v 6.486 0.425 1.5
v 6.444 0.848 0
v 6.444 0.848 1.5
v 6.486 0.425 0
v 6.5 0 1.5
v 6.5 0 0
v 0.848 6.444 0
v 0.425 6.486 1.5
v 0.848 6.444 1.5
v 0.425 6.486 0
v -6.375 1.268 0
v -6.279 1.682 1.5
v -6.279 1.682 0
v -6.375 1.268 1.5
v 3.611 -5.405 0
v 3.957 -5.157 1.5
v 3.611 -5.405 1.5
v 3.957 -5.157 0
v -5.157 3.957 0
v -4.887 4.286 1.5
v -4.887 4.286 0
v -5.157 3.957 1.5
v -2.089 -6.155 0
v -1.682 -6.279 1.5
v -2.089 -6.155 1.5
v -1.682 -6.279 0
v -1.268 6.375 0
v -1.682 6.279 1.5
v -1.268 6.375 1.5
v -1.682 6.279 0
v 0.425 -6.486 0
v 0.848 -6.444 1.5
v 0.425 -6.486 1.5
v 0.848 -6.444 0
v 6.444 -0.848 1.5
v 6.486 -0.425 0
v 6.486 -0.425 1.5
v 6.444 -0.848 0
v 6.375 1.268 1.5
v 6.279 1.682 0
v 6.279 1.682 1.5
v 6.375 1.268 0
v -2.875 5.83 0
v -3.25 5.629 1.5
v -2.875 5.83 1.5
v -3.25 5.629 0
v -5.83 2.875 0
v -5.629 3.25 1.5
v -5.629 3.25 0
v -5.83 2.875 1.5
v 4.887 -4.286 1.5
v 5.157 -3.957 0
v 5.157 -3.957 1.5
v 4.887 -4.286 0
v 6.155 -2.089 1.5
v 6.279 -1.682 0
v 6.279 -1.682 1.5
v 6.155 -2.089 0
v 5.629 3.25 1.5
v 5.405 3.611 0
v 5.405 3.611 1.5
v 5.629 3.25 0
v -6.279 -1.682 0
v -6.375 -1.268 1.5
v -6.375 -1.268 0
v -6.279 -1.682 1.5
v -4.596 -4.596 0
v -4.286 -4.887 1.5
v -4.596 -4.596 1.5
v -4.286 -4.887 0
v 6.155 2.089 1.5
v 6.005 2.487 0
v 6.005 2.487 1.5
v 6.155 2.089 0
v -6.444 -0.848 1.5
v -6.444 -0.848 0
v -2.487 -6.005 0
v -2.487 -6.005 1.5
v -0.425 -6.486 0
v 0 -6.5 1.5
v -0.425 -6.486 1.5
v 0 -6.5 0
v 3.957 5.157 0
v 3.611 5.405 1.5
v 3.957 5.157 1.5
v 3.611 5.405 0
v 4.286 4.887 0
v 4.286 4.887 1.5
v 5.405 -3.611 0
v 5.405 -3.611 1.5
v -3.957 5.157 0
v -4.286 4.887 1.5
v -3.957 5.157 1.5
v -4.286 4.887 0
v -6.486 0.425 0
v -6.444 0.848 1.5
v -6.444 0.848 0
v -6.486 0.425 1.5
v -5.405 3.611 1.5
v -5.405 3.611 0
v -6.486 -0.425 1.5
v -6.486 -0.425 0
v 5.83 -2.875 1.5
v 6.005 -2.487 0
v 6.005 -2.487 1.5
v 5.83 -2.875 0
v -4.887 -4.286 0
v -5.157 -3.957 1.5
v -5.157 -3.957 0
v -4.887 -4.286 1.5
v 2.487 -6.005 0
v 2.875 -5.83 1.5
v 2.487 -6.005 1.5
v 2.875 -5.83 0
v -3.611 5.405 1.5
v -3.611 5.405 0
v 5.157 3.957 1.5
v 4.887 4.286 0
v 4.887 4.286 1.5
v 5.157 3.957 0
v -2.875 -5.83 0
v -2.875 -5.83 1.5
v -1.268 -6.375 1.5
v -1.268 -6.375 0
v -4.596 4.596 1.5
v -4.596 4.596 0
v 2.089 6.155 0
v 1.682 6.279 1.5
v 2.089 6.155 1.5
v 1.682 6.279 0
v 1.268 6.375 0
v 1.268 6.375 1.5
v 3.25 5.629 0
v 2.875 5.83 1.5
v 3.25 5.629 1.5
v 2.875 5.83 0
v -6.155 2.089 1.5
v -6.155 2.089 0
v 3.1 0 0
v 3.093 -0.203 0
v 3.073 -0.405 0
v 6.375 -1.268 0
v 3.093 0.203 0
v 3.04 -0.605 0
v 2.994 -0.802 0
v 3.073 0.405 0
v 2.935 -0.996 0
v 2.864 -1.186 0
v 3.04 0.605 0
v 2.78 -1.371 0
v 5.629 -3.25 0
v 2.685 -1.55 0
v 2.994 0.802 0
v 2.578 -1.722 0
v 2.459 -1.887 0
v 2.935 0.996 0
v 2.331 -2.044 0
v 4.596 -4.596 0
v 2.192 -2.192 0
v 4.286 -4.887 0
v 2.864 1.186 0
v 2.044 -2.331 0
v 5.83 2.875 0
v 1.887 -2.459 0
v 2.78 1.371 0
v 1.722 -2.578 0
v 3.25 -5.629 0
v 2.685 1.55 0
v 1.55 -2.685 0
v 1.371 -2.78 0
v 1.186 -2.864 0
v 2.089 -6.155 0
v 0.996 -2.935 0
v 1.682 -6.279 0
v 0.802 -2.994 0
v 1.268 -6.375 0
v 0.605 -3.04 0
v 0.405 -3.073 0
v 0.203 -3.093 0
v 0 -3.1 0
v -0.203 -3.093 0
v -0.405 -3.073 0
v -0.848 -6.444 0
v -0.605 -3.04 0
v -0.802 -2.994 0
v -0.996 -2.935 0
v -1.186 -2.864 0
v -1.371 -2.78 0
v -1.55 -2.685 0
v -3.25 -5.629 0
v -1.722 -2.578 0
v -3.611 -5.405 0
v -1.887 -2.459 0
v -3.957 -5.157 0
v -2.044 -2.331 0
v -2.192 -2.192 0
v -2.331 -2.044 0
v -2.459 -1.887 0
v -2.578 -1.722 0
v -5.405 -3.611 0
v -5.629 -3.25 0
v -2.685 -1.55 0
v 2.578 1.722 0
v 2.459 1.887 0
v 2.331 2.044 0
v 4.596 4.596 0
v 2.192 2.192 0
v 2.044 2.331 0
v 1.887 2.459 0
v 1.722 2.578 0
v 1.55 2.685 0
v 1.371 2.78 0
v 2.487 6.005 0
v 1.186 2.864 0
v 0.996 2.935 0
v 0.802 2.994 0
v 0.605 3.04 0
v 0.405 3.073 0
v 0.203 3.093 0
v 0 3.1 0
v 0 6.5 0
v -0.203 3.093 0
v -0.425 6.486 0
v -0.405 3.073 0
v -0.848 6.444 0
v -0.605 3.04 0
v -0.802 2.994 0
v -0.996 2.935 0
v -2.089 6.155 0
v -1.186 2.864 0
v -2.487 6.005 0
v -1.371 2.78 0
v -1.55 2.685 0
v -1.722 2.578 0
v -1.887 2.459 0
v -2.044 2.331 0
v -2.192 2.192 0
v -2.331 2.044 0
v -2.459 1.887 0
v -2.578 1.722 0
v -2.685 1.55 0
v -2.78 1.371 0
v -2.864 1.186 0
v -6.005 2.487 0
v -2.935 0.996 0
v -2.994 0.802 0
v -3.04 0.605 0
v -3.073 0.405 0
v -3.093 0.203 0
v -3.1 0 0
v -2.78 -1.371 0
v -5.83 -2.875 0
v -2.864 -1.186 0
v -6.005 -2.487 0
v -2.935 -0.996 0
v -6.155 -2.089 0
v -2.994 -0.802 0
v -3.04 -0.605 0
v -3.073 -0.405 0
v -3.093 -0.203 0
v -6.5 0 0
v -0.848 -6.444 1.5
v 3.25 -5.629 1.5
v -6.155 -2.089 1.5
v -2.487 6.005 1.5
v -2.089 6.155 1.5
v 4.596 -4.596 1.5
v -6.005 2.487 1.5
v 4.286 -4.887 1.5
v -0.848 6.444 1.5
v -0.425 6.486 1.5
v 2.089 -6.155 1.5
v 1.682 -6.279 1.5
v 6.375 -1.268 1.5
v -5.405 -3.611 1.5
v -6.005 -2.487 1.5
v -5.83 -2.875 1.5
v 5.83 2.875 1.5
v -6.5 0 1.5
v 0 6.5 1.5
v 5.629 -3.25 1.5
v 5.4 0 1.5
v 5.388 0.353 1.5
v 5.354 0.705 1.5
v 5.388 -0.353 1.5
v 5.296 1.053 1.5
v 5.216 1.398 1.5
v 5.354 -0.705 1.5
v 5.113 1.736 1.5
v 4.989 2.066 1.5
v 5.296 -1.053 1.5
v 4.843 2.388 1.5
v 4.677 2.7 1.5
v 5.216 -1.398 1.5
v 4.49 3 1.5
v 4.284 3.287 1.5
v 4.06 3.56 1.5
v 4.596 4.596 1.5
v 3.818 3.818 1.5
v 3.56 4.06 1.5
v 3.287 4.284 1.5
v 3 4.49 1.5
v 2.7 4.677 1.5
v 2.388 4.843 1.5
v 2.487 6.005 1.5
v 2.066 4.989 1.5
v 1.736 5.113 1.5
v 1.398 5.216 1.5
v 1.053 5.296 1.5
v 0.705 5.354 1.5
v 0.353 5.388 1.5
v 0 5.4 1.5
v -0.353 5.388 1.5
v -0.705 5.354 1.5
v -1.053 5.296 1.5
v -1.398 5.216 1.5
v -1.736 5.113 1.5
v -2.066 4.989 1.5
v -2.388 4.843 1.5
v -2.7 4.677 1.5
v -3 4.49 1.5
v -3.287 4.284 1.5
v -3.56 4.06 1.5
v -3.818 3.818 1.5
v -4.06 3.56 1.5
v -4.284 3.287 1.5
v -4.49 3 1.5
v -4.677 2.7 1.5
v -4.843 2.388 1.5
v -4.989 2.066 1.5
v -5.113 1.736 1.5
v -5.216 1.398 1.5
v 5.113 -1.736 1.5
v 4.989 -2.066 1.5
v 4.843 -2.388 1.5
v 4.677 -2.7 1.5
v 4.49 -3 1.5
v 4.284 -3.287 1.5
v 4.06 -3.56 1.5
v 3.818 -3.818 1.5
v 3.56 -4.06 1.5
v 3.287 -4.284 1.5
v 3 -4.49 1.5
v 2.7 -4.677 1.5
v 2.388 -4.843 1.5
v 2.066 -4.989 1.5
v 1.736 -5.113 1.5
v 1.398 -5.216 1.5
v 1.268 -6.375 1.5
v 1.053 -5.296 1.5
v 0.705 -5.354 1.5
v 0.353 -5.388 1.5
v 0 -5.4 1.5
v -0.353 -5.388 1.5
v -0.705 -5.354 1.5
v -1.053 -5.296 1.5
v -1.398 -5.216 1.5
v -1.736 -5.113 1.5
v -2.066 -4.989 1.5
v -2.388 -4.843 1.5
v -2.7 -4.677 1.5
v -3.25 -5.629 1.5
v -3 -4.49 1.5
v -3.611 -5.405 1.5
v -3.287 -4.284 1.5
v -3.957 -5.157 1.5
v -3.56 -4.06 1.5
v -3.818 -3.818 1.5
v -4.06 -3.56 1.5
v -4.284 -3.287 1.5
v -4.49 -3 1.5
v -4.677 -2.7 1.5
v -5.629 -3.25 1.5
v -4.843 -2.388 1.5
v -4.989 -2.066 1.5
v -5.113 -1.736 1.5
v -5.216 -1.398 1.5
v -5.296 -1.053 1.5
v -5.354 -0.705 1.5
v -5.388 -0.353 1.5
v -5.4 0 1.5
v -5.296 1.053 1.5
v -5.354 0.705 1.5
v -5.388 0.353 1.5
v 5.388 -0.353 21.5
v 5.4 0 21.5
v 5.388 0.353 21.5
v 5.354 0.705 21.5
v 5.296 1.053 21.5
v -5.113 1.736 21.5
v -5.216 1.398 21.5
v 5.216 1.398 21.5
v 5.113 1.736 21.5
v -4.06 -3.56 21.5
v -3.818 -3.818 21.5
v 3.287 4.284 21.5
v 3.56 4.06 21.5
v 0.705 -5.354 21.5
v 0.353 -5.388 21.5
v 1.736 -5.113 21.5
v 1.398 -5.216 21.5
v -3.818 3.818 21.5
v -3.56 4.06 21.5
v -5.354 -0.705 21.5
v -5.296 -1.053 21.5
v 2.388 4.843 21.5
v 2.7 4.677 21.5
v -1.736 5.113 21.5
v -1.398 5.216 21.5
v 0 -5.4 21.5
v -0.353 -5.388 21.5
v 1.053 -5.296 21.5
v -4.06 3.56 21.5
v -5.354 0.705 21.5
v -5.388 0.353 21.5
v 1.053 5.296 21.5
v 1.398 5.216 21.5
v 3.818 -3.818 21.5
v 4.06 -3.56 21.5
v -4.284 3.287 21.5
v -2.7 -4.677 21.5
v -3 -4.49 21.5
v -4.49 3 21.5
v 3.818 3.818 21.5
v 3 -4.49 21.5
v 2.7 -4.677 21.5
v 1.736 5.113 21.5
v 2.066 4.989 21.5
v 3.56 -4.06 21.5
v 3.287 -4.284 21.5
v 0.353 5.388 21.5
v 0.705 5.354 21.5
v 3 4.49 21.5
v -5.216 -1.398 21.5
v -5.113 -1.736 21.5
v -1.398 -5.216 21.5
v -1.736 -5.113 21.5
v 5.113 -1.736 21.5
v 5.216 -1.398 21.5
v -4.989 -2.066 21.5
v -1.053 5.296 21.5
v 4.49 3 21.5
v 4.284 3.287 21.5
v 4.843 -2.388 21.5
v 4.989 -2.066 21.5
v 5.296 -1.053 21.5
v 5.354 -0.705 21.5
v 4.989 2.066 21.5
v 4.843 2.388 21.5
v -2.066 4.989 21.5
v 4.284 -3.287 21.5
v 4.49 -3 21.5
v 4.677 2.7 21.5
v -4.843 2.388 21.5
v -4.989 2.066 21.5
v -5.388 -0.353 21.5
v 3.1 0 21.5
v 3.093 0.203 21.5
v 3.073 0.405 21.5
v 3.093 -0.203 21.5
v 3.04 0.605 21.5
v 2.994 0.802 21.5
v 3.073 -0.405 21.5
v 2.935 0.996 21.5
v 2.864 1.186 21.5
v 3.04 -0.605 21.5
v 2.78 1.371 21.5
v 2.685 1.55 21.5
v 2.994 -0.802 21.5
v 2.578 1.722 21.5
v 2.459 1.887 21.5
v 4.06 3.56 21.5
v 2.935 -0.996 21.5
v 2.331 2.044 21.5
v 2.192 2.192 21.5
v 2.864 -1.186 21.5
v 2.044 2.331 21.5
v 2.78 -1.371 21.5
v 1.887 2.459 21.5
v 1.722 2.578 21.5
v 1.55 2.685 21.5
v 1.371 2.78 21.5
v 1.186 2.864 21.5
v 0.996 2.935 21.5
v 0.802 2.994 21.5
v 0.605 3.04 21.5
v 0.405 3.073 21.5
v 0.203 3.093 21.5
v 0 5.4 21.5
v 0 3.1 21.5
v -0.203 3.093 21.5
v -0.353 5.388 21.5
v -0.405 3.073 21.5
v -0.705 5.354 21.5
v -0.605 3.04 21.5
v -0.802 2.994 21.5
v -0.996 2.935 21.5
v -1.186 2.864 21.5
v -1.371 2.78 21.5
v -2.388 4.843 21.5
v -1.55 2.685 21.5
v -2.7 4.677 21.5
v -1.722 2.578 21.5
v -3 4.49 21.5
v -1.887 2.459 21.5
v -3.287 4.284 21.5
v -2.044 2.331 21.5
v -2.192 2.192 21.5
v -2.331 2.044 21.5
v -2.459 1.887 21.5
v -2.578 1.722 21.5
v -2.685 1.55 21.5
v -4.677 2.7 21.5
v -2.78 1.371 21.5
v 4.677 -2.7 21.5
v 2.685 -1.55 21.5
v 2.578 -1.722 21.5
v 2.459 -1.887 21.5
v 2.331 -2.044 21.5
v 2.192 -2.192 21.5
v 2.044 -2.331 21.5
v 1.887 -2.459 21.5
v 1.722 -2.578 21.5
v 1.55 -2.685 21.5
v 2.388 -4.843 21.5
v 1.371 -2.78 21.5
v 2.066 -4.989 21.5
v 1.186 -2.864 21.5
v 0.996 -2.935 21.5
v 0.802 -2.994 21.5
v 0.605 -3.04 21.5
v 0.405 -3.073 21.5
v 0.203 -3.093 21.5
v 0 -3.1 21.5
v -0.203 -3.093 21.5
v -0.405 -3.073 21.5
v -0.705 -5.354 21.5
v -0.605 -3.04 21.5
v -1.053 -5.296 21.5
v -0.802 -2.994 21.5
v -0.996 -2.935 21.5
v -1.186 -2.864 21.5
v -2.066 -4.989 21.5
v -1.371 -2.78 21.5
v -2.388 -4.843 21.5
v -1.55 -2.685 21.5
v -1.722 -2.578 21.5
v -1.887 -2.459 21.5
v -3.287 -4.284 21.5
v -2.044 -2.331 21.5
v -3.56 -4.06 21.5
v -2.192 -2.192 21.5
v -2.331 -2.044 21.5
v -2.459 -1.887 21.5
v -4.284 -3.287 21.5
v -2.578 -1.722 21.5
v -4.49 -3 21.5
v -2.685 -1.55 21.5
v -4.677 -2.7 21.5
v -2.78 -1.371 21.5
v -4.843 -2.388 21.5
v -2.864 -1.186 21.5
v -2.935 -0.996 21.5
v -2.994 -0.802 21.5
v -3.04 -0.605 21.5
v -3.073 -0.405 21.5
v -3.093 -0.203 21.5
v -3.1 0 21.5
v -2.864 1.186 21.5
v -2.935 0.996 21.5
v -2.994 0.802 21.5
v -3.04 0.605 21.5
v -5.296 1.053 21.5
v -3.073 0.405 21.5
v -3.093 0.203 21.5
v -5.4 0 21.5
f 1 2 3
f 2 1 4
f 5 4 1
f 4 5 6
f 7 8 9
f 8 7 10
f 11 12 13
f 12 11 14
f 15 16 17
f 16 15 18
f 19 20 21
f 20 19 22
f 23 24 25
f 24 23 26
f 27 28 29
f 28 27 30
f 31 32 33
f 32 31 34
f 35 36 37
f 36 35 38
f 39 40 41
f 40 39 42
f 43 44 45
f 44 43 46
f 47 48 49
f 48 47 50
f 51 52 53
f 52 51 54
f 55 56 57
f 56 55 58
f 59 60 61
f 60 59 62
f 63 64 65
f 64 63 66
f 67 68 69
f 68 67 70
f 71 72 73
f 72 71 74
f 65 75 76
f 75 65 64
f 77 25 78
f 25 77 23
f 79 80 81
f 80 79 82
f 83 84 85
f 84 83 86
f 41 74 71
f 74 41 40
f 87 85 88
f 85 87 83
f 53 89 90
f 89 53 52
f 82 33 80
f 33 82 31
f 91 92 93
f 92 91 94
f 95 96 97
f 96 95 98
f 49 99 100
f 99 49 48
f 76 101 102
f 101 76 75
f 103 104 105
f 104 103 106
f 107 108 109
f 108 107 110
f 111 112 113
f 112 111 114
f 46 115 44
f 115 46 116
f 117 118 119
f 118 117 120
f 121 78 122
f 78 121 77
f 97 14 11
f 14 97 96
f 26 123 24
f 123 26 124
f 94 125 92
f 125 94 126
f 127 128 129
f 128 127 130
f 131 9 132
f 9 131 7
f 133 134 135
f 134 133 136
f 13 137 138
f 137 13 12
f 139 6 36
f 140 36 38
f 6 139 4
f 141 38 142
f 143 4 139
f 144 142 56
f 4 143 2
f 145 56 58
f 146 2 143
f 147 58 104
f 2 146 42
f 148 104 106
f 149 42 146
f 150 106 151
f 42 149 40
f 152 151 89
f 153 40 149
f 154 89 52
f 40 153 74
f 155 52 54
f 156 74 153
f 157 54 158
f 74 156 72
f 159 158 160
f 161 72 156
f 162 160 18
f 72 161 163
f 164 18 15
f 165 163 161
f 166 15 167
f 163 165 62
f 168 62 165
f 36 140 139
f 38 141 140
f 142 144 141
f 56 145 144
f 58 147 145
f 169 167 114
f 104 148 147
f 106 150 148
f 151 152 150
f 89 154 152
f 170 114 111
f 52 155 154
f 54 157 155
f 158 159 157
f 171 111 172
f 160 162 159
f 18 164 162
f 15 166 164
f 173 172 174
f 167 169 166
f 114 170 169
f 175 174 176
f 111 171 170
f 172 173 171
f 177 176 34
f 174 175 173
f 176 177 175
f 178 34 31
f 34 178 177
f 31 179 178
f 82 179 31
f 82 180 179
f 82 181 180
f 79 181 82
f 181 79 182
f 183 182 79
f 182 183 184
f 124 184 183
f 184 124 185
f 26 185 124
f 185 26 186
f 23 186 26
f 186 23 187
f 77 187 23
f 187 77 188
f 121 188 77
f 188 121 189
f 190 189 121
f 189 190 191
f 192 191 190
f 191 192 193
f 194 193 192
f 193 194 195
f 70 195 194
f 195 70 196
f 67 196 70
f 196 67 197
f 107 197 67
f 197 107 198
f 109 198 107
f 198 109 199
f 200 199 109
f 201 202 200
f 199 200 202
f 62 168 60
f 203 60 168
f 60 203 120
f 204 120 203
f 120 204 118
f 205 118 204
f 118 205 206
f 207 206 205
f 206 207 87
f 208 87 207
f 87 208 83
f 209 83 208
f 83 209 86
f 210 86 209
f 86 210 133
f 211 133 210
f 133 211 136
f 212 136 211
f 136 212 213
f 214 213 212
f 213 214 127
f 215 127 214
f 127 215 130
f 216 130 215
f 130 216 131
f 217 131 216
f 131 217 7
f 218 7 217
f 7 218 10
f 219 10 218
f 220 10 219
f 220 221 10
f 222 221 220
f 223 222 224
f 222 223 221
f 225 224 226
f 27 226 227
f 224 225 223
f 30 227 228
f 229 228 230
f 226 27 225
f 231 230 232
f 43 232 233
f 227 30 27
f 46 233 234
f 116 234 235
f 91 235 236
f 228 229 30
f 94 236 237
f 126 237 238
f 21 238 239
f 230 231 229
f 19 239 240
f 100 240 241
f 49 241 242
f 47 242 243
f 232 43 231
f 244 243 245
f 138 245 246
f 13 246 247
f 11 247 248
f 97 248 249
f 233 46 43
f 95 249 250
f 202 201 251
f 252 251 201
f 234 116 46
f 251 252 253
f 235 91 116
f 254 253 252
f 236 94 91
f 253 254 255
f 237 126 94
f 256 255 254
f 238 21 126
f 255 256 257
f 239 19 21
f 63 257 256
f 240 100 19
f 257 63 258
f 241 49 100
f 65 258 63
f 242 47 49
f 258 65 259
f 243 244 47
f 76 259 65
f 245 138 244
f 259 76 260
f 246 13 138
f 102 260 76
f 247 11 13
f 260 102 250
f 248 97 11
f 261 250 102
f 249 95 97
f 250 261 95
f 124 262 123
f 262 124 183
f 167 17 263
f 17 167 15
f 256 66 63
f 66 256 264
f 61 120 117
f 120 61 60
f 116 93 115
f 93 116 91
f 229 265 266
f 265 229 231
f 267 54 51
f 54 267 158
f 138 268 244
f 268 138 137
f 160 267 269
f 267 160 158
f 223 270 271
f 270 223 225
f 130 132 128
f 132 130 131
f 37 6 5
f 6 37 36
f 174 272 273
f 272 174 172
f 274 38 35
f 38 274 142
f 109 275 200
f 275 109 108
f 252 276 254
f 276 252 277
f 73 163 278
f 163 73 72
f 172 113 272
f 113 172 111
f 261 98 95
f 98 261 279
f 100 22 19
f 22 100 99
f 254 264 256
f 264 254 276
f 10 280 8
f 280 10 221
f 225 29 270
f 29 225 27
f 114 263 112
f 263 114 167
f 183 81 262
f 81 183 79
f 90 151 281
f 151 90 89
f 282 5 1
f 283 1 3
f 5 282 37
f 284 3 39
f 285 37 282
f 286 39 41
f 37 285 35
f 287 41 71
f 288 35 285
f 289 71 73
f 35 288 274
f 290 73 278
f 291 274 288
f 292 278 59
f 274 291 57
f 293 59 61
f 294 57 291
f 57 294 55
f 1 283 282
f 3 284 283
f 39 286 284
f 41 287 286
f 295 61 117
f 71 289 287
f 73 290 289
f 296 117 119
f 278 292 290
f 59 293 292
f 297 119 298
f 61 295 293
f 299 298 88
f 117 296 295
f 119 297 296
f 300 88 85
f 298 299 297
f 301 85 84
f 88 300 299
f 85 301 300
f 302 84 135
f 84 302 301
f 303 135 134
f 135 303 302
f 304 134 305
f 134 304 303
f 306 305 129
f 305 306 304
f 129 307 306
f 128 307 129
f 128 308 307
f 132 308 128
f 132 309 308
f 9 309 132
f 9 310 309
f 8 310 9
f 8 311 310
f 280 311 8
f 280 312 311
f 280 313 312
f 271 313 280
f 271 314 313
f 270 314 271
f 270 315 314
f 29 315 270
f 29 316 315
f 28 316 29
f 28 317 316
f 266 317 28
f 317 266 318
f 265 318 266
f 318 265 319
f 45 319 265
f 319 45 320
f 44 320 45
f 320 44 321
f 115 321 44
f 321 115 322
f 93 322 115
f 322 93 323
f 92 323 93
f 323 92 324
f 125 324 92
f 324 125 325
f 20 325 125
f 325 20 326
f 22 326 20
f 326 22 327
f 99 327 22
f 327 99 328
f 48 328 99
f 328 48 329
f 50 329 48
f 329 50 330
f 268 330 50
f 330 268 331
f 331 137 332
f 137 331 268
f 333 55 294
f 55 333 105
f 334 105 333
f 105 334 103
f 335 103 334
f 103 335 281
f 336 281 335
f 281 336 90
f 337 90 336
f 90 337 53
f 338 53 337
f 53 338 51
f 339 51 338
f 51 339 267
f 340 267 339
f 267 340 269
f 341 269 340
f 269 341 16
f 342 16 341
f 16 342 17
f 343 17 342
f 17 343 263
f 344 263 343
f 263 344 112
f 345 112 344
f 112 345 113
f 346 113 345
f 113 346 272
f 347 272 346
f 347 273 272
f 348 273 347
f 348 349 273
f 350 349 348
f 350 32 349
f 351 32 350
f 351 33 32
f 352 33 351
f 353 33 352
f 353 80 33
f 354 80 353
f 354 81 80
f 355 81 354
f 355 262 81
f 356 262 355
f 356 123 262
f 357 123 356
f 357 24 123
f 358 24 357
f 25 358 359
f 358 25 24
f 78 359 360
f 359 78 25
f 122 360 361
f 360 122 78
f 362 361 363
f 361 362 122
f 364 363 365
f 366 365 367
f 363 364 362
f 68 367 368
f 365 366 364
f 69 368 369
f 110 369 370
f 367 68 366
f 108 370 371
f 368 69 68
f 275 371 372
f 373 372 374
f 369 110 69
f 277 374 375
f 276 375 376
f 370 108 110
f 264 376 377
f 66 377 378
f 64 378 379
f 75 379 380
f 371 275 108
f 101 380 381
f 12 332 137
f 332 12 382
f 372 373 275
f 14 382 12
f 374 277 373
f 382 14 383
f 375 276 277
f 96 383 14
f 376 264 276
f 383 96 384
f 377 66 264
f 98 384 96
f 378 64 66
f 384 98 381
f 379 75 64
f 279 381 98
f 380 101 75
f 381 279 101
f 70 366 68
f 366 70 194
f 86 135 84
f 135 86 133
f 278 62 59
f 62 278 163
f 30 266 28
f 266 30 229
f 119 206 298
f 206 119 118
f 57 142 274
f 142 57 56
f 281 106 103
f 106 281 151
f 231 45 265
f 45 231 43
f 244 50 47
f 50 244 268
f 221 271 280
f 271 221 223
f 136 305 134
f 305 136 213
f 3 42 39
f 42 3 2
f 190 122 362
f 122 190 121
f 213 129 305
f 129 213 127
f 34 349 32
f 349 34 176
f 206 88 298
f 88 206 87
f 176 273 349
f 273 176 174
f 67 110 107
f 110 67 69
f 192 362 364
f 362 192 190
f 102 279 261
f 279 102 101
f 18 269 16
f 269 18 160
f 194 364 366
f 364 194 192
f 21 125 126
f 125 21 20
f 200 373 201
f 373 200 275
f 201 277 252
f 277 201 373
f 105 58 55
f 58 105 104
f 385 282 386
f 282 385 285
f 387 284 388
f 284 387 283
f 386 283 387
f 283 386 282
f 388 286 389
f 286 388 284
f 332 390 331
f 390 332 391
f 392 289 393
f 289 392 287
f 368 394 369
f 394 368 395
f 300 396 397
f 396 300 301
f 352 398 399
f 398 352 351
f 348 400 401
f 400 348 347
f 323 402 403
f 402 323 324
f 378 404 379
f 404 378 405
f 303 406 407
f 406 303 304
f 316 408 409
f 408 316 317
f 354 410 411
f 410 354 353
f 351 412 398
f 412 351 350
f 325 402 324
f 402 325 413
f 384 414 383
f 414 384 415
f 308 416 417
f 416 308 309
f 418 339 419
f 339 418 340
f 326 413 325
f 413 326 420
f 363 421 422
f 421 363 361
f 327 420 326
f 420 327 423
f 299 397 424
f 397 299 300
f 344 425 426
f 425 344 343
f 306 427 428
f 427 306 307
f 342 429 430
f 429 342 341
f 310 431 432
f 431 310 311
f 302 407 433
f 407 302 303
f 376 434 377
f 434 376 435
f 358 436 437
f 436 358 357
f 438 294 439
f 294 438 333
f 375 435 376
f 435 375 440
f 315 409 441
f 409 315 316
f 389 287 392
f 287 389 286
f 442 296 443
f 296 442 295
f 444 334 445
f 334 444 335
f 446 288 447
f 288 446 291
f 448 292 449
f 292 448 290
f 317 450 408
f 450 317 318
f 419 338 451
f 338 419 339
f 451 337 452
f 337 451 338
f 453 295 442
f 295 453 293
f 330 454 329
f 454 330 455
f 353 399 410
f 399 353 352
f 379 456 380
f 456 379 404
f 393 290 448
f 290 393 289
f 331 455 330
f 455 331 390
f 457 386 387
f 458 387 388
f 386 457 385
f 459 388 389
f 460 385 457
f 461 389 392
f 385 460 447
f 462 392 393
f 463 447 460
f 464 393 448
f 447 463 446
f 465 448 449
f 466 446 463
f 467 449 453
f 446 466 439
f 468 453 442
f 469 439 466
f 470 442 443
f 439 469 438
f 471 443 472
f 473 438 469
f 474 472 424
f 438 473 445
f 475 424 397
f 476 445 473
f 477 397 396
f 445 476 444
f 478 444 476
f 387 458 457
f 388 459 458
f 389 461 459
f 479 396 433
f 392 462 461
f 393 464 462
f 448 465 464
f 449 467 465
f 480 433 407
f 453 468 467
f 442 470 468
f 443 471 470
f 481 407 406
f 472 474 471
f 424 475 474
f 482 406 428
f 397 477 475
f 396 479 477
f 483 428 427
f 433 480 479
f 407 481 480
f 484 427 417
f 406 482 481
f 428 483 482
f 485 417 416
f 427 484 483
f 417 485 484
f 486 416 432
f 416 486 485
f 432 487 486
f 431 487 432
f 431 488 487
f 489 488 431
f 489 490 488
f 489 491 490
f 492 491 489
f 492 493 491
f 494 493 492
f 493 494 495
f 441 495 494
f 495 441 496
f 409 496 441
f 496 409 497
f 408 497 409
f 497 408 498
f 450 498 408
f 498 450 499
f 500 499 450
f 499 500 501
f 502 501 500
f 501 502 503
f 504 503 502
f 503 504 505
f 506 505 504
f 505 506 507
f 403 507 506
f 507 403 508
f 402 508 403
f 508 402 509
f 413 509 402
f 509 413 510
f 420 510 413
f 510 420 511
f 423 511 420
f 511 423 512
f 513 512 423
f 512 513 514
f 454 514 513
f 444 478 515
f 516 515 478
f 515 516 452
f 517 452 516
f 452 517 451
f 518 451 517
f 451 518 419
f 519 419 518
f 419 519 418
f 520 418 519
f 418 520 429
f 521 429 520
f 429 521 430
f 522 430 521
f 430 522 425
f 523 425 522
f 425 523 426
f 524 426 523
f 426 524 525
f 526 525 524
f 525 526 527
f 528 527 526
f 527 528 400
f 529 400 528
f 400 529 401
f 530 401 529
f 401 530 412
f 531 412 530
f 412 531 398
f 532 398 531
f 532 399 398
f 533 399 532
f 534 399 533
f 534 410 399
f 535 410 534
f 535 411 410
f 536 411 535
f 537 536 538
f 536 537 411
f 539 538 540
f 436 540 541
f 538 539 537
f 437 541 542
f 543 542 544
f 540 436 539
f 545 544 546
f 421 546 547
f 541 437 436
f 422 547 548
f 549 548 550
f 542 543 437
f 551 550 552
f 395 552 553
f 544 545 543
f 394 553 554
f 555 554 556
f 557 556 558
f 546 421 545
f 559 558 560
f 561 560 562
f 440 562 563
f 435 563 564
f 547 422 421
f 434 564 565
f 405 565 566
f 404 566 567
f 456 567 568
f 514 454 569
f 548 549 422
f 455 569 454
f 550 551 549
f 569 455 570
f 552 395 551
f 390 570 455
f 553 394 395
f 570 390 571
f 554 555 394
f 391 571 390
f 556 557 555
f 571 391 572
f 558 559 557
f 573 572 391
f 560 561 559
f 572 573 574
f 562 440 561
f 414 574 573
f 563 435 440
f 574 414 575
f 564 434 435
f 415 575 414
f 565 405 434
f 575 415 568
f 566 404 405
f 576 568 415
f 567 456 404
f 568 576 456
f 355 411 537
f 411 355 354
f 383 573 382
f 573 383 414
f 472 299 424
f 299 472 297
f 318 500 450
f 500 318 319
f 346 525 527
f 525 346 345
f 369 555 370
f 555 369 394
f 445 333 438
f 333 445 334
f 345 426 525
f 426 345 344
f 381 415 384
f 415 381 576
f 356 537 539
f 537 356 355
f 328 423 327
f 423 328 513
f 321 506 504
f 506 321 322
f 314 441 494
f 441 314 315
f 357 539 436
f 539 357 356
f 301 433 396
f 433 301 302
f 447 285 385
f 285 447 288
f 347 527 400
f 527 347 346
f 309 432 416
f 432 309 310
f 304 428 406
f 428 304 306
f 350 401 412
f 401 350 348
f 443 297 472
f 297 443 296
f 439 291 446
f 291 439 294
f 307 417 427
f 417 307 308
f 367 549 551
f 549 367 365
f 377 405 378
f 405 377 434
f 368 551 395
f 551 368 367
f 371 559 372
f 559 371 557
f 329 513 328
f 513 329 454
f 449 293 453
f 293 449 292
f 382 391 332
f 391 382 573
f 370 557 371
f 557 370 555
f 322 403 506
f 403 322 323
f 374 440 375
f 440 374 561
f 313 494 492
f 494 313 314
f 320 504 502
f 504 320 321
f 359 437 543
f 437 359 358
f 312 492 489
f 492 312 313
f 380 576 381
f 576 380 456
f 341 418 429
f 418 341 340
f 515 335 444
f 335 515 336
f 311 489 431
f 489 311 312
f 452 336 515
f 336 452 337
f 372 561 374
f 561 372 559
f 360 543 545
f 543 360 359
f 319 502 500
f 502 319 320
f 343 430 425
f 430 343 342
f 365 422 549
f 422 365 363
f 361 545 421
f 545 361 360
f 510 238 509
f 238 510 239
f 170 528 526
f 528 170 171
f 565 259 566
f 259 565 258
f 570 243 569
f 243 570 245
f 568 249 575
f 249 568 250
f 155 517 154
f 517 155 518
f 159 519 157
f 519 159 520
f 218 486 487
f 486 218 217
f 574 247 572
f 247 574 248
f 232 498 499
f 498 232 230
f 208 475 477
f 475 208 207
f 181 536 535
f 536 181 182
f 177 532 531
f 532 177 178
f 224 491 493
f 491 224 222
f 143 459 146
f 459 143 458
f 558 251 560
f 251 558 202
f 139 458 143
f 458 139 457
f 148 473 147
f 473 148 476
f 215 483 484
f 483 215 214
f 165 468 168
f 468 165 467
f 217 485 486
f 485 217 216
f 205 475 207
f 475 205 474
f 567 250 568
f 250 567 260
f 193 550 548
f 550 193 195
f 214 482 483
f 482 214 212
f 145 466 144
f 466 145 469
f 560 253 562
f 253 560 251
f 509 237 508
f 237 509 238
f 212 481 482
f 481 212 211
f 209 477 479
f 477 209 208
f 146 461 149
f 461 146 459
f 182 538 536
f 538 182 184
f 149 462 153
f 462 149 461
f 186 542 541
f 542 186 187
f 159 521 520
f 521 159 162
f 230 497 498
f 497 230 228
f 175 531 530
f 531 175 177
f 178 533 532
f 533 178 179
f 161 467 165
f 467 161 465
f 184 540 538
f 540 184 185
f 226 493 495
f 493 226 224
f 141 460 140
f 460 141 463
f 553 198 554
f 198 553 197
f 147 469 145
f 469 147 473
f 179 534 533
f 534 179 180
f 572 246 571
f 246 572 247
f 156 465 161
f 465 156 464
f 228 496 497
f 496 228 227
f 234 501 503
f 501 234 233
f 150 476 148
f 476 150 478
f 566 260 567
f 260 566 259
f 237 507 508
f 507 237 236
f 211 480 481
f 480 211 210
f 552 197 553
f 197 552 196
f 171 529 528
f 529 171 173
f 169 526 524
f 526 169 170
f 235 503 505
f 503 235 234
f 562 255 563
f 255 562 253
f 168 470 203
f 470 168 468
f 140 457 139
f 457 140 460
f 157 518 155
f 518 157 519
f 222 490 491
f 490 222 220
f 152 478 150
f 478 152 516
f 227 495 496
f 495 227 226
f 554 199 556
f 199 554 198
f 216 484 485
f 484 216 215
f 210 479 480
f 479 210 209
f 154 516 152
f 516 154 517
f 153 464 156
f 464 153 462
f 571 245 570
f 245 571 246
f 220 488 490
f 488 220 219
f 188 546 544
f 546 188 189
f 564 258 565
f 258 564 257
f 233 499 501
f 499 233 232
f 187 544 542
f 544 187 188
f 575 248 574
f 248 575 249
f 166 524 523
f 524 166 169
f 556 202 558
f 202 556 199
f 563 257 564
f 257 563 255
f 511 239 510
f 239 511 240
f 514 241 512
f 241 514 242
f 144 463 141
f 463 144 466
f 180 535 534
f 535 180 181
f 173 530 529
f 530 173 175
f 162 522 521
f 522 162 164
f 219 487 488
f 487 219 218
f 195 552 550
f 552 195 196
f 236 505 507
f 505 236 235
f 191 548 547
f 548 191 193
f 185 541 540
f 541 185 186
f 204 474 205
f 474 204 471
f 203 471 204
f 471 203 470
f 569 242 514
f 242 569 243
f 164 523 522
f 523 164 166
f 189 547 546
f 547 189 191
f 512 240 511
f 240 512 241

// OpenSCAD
// PCR tube adapter sleeve - fits 0.2 mL tubes into 1.5 mL rack holes
// Print orientation: collar on bed (z = 0), sleeve body rises to z = 21.5

// ---------------- Parameters ----------------
tube_od        = 10.8;   // outer diameter of sleeve body (mm)
collar_d       = 13;     // outer diameter of base collar (mm)
collar_h       = 1.5;    // collar thickness (mm), z = 0 to 1.5
sleeve_h       = 21.5;   // top of sleeve body (mm)
bore_d         = 6.2;    // through-bore diameter (mm)
eps            = 0.5;    // cutter overshoot past faces (mm)
$fn            = 96;     // curve resolution

sleeve_body_h  = sleeve_h - collar_h;  // body height above collar (20 mm)

// ---------------- Model ----------------
difference() {
    union() {
        // Base collar, z = 0 to 1.5
        cylinder(d = collar_d, h = collar_h);

        // Sleeve body, z = 1.5 to 21.5 (slight overlap into collar for a clean union)
        translate([0, 0, collar_h - 0.01])
            cylinder(d = tube_od, h = sleeve_body_h + 0.01);
    }

    // Straight through-bore, open at both ends
    translate([0, 0, -eps])
        cylinder(d = bore_d, h = sleeve_h + 2 * eps);
}
